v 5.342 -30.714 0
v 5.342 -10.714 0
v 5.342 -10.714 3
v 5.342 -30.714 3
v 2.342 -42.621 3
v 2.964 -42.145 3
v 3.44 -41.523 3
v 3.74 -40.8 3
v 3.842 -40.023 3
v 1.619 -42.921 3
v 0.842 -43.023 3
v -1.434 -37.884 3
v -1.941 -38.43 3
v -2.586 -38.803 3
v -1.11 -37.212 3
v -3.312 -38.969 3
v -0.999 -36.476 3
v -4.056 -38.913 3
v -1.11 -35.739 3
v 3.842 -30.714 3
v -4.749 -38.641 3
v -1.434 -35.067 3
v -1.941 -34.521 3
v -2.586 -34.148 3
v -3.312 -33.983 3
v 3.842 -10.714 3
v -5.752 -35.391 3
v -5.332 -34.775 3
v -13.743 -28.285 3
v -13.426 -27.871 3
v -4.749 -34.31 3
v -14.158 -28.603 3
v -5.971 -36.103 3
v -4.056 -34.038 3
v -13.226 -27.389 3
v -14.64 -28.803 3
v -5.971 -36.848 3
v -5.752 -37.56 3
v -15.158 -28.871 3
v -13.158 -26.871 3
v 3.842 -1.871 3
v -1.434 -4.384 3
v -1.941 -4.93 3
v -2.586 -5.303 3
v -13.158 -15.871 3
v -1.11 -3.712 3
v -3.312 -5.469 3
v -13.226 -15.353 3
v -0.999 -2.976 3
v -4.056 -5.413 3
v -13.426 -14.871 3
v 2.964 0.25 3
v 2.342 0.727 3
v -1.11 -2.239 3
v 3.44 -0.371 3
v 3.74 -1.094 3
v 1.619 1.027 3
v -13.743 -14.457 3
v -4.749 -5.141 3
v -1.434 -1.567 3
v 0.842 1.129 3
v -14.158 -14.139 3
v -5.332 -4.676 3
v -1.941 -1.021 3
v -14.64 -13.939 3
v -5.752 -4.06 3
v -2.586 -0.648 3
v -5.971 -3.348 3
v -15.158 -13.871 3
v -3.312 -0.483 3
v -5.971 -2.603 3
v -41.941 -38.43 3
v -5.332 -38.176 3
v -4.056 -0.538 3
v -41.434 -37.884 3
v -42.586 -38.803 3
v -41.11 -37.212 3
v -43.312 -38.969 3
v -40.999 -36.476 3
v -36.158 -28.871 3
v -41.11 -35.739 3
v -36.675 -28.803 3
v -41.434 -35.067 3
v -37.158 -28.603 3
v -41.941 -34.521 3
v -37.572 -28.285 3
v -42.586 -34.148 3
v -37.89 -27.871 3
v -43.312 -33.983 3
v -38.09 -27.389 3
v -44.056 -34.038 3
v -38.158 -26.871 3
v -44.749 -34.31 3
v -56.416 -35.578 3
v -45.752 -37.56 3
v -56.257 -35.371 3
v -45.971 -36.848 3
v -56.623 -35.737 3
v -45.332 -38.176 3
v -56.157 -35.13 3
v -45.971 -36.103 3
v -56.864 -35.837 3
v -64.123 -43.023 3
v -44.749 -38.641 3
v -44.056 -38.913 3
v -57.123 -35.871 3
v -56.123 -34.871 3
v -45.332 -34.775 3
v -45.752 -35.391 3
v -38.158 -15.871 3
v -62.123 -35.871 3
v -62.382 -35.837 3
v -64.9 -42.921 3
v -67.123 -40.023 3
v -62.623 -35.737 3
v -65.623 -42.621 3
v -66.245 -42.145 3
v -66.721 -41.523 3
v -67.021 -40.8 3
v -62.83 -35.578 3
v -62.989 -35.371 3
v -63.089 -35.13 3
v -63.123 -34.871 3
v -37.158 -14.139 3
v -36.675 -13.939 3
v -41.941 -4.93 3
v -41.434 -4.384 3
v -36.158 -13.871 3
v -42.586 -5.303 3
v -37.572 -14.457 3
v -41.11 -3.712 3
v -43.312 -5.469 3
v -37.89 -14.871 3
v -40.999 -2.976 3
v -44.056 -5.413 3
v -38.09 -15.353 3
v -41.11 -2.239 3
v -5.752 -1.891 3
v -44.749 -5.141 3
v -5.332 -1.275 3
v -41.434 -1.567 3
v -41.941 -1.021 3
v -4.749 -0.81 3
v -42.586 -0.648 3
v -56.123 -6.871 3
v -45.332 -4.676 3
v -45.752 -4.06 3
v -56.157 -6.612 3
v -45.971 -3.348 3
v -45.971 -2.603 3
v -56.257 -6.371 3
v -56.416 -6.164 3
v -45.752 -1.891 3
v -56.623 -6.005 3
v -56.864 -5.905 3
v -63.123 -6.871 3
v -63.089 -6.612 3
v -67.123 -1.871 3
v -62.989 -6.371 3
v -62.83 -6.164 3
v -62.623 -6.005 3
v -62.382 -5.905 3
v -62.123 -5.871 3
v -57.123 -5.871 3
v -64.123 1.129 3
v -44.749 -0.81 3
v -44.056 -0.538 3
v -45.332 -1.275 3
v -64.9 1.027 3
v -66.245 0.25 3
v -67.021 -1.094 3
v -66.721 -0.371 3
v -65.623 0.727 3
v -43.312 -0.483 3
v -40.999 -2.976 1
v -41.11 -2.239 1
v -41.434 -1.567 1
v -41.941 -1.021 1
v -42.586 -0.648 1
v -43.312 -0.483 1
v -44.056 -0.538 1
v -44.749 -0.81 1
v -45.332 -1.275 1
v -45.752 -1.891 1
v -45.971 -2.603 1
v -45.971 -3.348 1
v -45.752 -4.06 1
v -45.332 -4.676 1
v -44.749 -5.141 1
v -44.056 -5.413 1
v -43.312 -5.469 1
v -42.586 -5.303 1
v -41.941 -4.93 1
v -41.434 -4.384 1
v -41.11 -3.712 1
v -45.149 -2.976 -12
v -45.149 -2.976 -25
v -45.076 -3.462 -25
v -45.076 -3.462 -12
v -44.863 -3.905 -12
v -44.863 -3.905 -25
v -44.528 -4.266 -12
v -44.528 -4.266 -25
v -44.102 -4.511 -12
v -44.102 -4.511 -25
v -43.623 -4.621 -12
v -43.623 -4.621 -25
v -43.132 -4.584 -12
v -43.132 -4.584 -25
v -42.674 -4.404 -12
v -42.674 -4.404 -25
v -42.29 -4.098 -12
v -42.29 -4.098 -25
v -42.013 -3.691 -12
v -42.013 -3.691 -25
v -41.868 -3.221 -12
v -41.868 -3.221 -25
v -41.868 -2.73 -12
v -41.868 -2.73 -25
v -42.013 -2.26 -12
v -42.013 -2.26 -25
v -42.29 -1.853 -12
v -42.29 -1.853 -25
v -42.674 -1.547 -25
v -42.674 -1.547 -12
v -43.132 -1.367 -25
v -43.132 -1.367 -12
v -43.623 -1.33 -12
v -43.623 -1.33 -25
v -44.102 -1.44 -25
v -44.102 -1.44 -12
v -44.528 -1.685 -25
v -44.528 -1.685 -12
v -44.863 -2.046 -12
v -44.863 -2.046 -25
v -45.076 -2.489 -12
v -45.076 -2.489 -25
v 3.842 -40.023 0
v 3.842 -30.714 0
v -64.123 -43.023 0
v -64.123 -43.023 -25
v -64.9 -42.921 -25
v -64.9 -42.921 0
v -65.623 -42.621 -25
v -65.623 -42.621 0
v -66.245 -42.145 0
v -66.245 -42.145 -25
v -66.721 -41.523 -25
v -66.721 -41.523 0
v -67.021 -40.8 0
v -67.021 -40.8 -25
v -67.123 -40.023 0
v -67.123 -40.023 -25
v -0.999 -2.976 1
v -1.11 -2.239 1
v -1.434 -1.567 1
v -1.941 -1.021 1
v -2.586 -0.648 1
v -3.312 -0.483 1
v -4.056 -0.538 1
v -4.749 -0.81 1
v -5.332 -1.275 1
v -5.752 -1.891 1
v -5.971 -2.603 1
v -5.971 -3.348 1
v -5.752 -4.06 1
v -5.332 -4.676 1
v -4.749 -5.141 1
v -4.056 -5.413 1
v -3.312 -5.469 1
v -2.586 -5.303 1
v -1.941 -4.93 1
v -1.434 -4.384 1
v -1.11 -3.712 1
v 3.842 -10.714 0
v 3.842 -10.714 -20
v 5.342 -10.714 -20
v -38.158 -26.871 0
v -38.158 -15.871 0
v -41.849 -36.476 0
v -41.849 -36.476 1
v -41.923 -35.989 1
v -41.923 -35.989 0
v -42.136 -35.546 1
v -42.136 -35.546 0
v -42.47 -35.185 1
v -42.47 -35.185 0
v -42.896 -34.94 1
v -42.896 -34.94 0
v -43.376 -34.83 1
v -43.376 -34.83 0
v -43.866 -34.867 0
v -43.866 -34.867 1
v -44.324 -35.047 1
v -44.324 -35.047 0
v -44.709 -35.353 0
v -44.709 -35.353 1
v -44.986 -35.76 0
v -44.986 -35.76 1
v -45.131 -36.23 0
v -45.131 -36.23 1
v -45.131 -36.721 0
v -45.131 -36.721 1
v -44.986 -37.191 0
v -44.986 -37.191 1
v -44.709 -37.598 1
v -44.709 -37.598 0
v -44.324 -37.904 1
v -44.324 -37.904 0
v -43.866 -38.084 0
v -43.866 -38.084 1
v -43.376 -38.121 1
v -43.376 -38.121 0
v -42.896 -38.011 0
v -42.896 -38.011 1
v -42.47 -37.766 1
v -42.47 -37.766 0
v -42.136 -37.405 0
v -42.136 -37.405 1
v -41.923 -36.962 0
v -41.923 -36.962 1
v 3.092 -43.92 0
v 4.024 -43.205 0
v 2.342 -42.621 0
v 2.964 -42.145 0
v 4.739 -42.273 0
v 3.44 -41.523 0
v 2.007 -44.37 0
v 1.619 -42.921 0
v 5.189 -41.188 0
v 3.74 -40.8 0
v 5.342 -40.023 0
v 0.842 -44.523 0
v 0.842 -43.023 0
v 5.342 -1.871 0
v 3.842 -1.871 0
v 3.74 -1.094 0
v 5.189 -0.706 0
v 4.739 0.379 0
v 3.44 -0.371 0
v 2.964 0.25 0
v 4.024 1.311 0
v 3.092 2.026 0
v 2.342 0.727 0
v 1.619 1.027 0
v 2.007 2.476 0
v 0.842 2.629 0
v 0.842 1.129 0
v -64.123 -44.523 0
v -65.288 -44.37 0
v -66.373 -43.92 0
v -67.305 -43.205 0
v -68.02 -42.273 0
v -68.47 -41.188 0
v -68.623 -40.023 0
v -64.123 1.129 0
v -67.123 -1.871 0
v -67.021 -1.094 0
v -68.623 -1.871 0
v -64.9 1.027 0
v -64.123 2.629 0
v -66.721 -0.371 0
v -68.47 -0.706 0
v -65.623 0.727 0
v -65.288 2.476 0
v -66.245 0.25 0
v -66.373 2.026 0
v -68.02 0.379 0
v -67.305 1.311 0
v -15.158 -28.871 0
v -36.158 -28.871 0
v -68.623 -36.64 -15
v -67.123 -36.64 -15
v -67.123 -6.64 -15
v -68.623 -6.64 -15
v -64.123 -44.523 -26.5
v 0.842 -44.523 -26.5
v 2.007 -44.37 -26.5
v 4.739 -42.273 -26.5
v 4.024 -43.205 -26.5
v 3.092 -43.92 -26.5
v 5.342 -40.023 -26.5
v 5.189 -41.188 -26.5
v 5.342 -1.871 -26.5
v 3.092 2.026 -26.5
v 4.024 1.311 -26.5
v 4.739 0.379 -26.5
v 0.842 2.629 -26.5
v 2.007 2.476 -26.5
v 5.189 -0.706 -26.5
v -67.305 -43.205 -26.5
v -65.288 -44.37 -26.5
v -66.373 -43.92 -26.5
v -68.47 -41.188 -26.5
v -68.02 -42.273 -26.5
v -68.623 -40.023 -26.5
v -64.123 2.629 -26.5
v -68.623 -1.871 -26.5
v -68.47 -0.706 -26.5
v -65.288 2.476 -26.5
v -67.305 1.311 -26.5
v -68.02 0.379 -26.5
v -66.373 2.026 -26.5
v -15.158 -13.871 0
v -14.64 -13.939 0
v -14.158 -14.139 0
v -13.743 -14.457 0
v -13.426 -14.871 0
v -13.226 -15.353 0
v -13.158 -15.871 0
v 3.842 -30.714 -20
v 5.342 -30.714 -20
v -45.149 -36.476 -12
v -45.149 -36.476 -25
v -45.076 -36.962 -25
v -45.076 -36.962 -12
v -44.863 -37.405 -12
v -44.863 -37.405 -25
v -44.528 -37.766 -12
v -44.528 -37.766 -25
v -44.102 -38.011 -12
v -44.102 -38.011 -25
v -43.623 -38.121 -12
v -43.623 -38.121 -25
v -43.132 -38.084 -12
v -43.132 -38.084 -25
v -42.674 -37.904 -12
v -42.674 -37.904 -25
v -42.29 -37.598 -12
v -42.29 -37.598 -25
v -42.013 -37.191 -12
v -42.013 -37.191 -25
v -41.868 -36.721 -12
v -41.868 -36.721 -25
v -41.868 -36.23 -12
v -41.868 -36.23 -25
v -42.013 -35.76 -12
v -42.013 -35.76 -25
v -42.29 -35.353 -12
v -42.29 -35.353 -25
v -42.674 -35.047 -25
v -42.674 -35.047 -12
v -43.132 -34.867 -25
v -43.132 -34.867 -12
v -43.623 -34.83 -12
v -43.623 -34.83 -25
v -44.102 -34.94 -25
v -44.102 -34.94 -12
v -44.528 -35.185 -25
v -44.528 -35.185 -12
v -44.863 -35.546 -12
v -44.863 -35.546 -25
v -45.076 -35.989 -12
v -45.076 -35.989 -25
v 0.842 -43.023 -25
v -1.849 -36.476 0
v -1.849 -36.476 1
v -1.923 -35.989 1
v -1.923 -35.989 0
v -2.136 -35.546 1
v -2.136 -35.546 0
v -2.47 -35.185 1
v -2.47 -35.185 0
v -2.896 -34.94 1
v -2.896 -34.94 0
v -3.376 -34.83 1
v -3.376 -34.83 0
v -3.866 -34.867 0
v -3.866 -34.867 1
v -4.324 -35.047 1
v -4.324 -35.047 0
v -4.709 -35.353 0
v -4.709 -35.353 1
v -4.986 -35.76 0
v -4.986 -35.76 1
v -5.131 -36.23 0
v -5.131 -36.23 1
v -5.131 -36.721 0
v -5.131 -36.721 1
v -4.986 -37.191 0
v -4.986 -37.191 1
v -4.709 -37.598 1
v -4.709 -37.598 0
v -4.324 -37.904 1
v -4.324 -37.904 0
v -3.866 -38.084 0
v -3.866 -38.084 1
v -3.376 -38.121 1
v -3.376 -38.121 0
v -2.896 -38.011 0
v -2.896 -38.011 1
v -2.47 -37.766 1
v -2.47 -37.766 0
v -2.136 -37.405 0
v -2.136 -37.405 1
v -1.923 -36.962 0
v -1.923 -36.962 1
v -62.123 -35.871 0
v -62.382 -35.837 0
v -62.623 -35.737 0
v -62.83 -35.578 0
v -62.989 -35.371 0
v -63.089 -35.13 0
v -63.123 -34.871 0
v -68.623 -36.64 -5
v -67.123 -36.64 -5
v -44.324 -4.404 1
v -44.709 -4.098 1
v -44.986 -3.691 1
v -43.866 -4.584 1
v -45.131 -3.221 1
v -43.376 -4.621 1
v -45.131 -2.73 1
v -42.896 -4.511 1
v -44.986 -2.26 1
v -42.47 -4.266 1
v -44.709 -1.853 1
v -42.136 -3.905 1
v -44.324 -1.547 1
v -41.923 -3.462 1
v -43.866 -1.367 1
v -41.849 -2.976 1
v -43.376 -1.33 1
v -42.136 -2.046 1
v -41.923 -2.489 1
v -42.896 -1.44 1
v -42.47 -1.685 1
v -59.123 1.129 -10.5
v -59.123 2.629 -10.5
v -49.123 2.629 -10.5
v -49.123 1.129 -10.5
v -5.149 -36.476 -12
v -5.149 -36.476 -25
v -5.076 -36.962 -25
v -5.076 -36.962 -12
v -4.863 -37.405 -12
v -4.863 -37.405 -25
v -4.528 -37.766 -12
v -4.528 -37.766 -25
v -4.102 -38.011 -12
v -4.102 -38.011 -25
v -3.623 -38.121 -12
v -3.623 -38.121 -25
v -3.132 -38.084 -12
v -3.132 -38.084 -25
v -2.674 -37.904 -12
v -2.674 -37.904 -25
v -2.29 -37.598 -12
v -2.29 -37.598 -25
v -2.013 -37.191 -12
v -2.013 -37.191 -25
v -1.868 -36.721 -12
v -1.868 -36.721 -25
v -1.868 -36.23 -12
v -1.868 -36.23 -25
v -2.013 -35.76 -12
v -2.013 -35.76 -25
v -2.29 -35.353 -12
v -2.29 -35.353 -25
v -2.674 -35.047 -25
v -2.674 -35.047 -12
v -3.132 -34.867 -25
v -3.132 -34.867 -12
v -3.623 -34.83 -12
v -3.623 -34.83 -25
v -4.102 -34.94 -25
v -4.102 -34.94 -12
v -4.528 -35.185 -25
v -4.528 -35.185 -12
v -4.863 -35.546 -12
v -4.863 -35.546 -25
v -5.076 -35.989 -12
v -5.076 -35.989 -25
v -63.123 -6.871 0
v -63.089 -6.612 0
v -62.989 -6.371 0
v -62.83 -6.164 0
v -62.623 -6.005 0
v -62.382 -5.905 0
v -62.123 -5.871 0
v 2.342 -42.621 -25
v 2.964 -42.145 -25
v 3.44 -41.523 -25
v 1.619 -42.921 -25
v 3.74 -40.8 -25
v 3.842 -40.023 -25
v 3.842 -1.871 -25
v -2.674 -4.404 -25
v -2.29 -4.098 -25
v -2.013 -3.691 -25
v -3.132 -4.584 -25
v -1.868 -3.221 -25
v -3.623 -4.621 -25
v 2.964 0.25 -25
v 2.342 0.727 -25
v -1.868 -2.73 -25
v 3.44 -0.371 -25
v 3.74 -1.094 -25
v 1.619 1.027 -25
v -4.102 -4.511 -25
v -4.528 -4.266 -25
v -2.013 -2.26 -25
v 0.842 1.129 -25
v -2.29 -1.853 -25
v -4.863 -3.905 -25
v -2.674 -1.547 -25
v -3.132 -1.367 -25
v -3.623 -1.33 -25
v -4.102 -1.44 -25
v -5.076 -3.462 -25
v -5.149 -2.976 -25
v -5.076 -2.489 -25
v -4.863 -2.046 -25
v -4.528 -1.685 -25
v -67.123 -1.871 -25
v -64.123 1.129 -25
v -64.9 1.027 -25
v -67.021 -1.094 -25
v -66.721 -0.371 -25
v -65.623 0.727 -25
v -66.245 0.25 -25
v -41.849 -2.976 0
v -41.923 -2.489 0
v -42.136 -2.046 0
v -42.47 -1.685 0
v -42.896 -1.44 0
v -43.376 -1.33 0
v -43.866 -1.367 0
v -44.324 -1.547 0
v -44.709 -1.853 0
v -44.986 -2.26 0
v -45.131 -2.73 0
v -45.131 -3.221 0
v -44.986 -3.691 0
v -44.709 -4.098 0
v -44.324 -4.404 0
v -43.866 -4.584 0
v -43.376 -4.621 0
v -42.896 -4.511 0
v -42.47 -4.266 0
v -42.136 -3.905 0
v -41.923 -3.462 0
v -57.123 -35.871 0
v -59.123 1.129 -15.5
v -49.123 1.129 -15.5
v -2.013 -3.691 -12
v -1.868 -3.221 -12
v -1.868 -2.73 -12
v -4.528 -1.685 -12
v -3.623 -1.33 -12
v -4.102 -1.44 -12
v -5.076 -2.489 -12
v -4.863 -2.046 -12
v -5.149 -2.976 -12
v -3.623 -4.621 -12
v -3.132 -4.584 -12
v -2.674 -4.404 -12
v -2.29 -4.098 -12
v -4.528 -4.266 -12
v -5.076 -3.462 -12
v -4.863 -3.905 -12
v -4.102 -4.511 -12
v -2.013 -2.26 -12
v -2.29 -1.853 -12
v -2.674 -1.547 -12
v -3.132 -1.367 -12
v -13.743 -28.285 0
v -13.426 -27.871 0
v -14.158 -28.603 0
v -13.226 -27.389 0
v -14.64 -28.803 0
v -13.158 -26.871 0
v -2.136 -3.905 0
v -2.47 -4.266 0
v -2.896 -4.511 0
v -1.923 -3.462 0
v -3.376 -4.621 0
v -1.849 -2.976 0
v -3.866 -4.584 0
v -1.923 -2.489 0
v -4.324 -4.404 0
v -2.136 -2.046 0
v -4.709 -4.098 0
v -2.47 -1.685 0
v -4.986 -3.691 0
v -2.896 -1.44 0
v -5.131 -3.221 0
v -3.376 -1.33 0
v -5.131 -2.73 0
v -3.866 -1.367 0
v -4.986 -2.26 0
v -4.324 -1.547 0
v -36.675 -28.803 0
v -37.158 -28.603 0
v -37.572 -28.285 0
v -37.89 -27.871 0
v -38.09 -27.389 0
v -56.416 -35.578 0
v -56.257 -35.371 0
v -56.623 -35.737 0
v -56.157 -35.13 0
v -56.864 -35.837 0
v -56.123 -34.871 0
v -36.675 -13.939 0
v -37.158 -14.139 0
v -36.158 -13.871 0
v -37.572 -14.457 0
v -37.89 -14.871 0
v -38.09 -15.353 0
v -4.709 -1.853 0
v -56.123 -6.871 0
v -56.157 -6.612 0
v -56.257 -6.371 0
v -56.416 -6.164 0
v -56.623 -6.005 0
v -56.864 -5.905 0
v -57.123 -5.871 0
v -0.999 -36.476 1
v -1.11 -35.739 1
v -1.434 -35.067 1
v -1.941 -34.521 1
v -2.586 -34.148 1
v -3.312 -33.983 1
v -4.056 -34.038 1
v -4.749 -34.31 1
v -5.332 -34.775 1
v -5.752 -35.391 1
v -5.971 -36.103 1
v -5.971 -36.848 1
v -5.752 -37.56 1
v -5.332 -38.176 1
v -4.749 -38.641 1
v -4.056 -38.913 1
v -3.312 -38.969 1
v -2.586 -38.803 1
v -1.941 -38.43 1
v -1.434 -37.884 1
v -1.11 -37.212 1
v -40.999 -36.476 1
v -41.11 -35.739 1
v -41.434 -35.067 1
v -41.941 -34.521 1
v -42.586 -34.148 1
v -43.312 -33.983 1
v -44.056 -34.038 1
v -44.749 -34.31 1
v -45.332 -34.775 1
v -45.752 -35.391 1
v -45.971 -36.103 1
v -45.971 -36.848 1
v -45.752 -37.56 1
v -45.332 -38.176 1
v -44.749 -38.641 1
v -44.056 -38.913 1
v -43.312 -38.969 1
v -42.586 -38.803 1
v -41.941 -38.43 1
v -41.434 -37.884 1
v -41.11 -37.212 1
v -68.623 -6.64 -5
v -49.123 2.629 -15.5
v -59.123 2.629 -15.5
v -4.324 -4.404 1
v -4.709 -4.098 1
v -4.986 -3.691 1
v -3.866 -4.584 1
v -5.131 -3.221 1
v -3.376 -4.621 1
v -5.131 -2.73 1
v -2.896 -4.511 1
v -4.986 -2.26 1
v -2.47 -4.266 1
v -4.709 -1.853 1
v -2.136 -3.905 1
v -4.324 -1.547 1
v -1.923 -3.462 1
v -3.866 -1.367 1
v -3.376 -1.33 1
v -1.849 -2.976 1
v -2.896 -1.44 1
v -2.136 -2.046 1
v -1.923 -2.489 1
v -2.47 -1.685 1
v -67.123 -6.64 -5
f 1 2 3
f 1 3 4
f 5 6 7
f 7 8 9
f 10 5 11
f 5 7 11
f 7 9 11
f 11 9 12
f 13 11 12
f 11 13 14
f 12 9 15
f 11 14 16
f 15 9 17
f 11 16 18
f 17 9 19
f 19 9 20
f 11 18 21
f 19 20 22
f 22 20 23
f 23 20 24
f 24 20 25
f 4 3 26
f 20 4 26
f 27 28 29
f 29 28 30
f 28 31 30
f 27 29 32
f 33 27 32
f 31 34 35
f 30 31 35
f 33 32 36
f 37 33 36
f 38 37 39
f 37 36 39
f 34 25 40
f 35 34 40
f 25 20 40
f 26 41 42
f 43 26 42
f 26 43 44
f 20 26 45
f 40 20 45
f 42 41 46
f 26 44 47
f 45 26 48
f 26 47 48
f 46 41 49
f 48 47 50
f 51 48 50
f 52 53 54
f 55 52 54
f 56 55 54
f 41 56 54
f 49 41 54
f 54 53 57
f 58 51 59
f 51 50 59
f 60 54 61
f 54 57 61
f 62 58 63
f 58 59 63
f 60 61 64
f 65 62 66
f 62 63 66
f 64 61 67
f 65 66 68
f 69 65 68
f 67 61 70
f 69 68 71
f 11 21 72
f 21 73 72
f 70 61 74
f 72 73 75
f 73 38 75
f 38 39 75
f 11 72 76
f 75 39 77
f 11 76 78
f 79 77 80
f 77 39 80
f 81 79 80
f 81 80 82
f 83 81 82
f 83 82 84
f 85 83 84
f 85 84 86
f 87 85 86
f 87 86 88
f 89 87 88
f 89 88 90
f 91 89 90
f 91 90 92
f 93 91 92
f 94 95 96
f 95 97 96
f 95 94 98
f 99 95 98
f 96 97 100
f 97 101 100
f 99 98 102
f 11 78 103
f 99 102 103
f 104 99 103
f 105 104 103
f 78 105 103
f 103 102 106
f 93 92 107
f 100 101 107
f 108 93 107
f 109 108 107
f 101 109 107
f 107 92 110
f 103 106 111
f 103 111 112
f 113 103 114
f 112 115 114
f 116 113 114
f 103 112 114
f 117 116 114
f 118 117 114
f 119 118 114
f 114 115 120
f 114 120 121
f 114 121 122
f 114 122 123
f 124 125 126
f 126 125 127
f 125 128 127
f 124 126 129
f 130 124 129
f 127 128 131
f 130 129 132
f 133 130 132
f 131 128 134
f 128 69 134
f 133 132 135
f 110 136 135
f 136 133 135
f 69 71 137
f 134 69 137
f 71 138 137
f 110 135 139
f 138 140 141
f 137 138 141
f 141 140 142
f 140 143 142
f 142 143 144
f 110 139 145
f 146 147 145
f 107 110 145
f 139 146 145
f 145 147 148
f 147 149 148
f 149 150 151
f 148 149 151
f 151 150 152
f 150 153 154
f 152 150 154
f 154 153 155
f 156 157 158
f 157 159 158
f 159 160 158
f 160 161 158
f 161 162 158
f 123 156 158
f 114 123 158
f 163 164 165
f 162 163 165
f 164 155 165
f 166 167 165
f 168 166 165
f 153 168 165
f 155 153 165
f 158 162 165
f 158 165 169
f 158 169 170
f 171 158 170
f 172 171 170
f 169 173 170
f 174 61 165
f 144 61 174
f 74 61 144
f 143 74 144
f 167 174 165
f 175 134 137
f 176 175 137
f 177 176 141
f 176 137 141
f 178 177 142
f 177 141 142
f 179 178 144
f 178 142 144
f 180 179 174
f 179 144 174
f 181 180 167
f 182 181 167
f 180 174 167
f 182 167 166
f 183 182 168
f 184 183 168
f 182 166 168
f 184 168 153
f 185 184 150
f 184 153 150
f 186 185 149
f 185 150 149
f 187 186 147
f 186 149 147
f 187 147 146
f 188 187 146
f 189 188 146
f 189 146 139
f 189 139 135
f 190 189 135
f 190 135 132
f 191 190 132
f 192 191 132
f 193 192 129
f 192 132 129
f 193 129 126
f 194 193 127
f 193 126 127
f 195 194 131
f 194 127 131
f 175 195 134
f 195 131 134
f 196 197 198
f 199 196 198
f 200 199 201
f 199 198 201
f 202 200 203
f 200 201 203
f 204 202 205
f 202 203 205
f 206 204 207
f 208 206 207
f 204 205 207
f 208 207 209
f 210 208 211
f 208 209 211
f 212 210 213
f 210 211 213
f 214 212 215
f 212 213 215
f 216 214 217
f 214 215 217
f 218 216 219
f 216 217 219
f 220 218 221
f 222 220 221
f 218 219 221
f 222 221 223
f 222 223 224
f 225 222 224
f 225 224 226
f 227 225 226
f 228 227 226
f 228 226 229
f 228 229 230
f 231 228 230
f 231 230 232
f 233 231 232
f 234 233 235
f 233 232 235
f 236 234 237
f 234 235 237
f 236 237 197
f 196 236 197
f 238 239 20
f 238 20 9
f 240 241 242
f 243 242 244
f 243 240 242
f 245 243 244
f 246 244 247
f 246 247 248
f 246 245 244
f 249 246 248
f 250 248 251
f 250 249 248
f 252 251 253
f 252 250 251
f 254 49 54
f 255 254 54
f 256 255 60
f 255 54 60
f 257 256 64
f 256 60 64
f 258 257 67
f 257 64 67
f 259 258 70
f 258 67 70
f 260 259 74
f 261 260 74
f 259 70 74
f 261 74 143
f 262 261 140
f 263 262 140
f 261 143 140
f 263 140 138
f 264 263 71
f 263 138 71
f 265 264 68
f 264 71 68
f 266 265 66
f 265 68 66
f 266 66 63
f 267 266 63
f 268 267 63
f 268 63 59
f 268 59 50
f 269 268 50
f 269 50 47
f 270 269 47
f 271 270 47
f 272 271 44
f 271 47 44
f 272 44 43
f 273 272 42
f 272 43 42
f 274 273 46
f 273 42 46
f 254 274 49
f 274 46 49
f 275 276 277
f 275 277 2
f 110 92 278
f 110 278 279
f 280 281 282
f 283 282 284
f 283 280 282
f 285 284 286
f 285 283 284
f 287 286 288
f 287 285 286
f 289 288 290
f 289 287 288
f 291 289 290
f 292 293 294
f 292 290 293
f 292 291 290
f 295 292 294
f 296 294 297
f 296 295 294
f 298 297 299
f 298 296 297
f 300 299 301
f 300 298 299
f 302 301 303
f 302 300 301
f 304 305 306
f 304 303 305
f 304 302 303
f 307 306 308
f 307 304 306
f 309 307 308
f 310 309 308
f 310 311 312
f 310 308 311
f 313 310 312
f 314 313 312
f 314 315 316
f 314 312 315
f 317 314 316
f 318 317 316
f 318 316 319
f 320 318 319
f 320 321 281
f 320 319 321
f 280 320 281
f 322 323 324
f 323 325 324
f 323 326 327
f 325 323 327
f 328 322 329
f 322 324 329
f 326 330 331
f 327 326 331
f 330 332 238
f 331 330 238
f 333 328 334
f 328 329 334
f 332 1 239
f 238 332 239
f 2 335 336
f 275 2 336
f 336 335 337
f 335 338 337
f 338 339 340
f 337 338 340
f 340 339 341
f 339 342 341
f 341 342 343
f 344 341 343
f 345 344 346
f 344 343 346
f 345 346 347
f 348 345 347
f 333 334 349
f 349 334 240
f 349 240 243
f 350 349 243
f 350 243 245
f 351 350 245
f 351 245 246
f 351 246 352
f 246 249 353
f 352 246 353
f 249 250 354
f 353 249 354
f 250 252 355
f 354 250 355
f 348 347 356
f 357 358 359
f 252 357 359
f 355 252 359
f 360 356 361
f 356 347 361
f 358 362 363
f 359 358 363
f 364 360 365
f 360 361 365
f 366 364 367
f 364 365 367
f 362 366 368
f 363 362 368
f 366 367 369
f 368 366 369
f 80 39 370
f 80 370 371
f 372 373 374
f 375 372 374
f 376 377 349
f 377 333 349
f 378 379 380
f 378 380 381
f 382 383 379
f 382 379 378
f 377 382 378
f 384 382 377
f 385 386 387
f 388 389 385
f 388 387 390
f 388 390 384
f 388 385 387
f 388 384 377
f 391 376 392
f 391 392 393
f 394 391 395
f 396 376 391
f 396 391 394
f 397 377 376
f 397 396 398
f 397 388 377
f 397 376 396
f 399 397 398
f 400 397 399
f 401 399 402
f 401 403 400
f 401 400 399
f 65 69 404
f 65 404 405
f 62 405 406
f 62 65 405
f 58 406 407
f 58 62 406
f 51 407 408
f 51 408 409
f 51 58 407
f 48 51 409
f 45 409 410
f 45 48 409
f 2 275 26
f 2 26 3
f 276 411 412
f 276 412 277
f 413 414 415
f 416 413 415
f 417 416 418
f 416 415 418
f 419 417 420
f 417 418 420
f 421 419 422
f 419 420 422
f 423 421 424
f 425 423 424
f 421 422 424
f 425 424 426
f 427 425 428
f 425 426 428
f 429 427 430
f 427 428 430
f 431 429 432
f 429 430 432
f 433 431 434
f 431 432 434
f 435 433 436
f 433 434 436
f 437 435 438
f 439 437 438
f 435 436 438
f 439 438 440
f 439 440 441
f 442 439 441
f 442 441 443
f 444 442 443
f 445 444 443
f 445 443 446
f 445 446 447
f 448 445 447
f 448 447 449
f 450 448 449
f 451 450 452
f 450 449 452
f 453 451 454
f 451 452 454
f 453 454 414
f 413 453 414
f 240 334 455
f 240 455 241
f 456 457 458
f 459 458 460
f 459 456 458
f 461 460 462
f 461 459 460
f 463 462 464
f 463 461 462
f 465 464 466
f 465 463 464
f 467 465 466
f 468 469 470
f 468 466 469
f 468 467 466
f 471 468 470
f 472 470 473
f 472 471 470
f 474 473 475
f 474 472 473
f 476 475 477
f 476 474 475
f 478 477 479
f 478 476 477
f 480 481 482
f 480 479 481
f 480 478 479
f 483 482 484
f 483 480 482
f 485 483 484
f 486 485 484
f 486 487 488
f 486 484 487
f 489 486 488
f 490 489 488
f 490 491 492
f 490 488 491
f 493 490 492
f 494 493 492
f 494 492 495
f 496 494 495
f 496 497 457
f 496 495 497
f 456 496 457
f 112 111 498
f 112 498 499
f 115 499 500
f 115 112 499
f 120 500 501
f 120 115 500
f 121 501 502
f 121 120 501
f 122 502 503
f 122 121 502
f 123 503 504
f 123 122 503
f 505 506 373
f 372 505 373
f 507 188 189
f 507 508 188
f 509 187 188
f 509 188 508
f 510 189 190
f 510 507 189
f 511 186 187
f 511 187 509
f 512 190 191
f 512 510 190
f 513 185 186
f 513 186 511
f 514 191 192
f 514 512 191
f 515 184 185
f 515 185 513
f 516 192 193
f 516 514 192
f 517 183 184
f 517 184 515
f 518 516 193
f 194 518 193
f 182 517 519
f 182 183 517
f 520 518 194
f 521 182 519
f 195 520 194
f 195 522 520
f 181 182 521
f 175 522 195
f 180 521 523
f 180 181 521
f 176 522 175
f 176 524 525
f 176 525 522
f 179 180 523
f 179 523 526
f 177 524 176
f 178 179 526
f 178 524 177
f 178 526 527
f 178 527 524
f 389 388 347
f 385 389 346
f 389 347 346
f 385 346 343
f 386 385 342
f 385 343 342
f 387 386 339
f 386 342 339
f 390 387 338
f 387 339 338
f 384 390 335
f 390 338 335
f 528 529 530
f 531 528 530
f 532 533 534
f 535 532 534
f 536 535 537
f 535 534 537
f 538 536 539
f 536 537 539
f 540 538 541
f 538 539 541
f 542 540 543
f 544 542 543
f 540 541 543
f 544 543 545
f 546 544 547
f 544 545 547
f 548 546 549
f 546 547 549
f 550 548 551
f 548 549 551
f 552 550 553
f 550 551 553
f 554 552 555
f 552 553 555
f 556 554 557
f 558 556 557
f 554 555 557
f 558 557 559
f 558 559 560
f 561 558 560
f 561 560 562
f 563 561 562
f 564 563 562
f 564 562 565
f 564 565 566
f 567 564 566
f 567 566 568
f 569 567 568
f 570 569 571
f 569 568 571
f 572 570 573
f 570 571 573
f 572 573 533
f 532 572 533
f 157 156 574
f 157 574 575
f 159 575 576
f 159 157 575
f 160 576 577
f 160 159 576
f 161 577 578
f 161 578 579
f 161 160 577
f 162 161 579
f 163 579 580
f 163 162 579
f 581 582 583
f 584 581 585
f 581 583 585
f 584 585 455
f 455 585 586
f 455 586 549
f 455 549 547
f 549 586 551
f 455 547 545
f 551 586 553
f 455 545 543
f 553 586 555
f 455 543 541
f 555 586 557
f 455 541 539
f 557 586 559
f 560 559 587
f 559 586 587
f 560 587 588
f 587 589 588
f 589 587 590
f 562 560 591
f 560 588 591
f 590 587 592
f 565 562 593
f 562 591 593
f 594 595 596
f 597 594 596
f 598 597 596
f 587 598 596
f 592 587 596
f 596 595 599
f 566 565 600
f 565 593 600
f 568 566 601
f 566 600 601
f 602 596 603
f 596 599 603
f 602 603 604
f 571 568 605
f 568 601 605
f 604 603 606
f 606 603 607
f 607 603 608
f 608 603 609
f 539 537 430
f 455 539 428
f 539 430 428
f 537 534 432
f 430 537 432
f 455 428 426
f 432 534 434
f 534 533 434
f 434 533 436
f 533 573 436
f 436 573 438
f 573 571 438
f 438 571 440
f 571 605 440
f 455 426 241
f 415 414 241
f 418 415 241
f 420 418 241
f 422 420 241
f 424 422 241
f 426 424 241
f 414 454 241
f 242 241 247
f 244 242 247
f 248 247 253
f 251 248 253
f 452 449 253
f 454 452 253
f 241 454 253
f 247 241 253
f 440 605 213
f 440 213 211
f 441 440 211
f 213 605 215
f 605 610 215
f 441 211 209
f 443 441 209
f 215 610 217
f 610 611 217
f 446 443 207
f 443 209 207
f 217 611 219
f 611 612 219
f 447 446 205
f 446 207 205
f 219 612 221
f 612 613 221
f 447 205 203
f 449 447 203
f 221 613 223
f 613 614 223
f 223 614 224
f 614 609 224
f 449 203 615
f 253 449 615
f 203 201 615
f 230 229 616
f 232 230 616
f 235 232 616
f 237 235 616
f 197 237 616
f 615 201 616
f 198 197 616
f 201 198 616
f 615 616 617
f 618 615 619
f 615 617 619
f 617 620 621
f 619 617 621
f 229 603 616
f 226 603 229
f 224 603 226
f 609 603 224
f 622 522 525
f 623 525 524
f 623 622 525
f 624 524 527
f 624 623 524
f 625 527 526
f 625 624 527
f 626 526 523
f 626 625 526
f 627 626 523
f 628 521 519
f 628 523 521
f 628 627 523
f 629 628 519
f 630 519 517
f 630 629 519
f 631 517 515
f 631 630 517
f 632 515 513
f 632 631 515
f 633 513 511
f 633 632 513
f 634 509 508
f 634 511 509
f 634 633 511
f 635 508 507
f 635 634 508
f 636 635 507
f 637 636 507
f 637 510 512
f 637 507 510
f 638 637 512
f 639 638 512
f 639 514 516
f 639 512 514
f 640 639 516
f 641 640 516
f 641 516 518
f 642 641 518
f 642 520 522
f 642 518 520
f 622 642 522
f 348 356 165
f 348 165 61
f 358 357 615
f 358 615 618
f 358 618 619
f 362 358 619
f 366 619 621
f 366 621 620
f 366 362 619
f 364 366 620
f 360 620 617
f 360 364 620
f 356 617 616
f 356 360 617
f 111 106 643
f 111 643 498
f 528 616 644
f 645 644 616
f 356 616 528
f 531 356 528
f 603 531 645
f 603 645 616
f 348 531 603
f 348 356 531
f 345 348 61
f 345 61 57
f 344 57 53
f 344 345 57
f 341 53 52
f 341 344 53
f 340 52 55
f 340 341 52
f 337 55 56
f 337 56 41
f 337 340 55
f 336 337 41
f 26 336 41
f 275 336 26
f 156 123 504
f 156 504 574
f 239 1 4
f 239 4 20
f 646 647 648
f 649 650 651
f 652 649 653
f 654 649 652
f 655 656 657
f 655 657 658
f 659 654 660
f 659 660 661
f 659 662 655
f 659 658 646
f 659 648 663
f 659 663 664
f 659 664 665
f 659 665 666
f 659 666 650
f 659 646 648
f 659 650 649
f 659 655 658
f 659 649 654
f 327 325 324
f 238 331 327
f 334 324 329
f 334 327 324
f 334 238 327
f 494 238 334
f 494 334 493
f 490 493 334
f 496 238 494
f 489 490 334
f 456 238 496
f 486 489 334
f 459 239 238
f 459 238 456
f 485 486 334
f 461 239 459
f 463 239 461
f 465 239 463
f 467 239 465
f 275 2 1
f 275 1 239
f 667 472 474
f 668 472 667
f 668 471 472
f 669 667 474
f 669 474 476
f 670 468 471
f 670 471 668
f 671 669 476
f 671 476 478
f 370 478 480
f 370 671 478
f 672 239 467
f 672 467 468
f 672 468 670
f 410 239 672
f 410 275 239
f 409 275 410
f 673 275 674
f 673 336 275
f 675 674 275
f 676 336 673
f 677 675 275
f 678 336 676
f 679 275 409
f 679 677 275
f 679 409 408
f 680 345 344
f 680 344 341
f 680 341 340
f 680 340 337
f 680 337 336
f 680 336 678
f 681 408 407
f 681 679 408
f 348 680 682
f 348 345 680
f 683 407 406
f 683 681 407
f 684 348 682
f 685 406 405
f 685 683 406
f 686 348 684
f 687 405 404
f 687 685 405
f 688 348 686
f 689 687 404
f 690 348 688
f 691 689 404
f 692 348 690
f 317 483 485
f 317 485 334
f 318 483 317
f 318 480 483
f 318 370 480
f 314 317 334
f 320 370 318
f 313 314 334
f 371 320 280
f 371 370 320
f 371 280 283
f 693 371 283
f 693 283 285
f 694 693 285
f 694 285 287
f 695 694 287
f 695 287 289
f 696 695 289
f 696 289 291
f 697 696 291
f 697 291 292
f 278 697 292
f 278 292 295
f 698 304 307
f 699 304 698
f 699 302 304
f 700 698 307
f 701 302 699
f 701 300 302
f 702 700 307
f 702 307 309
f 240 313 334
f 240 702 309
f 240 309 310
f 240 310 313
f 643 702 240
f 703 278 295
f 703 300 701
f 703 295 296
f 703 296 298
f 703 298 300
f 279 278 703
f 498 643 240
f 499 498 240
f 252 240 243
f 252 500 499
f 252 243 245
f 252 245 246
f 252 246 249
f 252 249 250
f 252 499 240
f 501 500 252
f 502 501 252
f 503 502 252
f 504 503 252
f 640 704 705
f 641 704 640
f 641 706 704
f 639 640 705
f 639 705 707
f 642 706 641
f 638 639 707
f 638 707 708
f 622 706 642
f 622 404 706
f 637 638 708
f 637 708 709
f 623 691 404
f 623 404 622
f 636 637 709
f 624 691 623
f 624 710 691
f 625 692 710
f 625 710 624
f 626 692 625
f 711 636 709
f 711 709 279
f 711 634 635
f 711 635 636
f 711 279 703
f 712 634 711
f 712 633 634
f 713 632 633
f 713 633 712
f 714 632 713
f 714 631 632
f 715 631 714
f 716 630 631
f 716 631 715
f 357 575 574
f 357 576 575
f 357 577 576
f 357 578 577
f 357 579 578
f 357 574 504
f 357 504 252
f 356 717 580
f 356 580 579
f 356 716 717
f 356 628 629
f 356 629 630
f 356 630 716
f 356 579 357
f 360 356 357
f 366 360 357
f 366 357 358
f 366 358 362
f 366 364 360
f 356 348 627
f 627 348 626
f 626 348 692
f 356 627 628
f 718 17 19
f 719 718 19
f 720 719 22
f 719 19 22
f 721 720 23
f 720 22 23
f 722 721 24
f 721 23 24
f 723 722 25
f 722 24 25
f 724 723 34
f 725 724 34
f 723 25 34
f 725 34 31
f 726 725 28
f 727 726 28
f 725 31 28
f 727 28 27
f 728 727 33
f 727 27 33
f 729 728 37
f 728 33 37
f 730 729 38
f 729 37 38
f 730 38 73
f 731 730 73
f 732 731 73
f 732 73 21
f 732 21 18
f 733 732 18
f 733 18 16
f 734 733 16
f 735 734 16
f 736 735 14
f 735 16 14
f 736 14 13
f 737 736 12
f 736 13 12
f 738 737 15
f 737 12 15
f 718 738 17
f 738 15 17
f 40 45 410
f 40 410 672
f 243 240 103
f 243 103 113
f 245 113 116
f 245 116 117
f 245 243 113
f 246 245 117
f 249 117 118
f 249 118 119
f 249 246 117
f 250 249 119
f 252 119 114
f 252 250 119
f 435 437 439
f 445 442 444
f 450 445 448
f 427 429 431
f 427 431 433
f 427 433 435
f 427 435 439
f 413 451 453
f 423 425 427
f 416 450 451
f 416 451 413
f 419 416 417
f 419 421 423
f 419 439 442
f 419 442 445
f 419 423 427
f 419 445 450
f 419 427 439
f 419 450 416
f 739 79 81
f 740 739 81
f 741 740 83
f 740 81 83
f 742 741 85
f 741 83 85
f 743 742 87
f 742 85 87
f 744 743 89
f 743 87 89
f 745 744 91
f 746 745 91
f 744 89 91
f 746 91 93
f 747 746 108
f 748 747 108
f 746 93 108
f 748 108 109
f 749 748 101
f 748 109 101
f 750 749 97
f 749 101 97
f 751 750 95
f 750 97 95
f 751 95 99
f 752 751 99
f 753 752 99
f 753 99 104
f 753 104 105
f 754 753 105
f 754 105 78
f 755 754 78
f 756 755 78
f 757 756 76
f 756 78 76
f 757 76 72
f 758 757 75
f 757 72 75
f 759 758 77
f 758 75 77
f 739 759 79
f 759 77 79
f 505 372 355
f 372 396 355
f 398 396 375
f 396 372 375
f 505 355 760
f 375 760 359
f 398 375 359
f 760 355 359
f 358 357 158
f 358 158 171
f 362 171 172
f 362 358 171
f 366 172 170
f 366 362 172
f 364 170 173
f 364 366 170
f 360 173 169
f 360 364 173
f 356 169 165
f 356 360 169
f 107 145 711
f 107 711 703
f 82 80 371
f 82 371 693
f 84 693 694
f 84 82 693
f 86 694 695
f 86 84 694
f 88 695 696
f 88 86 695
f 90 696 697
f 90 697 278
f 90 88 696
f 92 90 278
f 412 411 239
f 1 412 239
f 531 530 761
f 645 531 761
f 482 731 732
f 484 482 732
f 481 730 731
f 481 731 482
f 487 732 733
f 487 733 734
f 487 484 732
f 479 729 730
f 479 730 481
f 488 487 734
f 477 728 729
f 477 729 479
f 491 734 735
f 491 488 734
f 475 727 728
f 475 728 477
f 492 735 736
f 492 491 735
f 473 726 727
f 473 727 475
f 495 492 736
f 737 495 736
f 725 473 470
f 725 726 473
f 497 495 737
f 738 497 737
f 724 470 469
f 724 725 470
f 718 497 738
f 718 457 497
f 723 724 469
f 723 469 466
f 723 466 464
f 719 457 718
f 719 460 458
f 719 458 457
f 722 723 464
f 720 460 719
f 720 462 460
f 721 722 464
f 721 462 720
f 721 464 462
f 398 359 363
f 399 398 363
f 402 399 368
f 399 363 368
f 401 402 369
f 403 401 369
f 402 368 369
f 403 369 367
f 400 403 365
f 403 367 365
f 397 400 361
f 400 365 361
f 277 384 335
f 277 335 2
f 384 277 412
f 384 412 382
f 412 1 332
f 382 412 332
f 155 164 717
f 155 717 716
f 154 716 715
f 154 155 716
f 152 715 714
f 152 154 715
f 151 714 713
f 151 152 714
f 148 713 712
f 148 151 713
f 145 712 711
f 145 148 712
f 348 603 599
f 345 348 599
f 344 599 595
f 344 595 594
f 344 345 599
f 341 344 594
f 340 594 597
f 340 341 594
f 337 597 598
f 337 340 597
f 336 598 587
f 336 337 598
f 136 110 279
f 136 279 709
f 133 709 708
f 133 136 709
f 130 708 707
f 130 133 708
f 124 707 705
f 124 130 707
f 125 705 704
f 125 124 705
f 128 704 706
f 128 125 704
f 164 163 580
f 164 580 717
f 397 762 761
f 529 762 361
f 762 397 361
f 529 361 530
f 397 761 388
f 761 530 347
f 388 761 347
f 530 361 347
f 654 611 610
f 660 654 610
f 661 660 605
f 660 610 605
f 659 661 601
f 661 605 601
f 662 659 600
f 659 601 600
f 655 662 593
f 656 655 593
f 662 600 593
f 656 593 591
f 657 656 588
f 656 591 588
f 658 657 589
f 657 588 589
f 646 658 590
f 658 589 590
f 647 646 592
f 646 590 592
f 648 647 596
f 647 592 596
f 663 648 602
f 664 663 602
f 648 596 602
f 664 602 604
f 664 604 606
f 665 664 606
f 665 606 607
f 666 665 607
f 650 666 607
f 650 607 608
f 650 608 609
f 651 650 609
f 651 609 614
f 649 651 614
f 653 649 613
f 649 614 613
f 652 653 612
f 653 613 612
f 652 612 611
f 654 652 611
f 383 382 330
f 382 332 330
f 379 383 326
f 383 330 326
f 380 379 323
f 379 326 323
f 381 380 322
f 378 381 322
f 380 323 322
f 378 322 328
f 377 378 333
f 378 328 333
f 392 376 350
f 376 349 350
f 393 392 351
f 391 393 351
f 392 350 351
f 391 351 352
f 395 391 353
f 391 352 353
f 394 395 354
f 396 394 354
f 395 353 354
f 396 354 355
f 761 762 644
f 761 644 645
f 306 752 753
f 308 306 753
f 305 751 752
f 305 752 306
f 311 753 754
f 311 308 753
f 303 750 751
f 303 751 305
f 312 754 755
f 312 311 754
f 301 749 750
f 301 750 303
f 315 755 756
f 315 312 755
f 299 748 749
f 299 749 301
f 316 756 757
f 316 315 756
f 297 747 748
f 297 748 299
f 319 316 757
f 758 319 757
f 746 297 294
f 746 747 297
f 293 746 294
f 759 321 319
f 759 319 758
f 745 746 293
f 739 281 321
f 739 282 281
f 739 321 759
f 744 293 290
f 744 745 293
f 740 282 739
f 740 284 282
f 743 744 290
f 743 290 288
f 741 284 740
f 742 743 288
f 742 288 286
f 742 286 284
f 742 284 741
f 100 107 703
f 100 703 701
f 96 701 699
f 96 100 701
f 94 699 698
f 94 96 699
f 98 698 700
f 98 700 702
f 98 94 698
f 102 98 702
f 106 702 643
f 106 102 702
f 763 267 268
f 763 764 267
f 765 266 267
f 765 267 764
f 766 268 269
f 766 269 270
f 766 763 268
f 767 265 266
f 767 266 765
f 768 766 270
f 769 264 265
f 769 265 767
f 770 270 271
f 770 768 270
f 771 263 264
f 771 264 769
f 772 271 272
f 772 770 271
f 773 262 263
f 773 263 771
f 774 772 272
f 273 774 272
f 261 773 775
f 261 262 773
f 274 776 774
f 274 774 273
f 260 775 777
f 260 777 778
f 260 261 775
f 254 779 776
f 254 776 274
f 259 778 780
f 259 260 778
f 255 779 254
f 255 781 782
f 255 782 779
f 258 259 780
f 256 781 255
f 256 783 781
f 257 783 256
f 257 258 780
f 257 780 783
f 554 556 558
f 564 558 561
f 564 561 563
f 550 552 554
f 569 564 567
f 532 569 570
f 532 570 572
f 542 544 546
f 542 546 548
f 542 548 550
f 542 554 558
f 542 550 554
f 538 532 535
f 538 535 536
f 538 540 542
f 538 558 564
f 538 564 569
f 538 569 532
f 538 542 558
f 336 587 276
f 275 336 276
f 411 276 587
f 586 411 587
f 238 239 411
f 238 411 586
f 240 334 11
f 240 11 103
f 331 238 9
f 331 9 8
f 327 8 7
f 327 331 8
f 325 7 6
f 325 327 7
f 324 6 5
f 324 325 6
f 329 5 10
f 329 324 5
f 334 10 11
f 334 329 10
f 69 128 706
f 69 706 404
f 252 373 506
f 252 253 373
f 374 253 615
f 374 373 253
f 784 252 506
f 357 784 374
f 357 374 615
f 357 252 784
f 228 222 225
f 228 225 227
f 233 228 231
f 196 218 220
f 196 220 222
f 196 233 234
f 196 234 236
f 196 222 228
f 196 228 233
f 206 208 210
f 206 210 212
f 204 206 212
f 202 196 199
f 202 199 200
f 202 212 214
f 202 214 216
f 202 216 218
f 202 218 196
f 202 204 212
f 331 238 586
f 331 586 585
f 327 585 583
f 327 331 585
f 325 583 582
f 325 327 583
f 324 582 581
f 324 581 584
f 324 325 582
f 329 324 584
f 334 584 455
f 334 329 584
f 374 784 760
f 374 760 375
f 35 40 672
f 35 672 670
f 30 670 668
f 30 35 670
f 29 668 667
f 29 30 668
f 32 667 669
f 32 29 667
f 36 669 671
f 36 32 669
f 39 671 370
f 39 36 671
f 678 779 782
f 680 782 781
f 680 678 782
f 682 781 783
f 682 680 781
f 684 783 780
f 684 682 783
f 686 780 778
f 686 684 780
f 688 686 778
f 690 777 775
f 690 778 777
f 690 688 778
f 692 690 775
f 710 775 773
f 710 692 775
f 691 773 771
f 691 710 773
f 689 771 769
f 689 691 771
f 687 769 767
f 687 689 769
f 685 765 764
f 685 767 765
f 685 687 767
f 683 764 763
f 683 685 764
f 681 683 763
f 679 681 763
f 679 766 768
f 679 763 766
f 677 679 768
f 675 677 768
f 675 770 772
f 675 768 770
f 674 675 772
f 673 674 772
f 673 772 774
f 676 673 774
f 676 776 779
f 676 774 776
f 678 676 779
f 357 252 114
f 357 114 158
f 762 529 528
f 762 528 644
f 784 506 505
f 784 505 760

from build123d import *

# Parameters (mm, degrees)
EXTRUDE_3_DEPTH     = 25
EXTRUDE_4_DEPTH     = 1.5
SKETCH_3_R          = 1.65
EXTRUDE_6_DEPTH     = 13
CUT_EXTRUDE_1_REACH = 91.083
SKETCH_4_W          = 10
SKETCH_4_H          = 30
CUT_EXTRUDE_2_REACH = 91.083
SKETCH_5_W          = 20
SKETCH_5_H          = 20
CUT_EXTRUDE_3_REACH = 89.377
SKETCH_6_W          = 10
SKETCH_6_H          = 5
EXTRUDE_7_DEPTH     = 3
CUT_EXTRUDE_START   = -3
SKETCH_8_R          = 1.65
CUT_EXTRUDE_5_DEPTH = 3
CUT_EXTRUDE_6_DEPTH = 3
CUT_EXTRUDE_7_DEPTH = 3
SKETCH_11_R         = 2.5
CUT_EXTRUDE_8_DEPTH = 2


with BuildPart() as part:
    # 草图1 → 凸台-拉伸3 (new body)
    with BuildSketch(Plane.XY):
        with BuildLine():
            Line((-64.123292314, 2.629066518), (0.8422956, 2.629066518))
            ThreePointArc((0.8422956, 2.629066518), (4.024276115, 1.311047034), (5.3422956, -1.870933482))
            Line((5.3422956, -1.870933482), (5.3422956, -40.023345988))
            ThreePointArc((5.3422956, -40.023345988), (4.024276115, -43.205326503), (0.8422956, -44.523345988))
            Line((0.8422956, -44.523345988), (-64.123292314, -44.523345988))
            ThreePointArc((-64.123292314, -44.523345988), (-67.30527283, -43.205326503), (-68.623292314, -40.023345988))
            Line((-68.623292314, -40.023345988), (-68.623292314, -1.870933482))
            ThreePointArc((-68.623292314, -1.870933482), (-67.30527283, 1.311047034), (-64.123292314, 2.629066518))
        make_face()
        with BuildLine():
            Line((-64.123292314, 1.129066518), (0.8422956, 1.129066518))
            ThreePointArc((0.8422956, 1.129066518), (2.963615943, 0.250386862), (3.8422956, -1.870933482))
            Line((3.8422956, -1.870933482), (3.8422956, -40.023345988))
            ThreePointArc((3.8422956, -40.023345988), (2.963615943, -42.144666332), (0.8422956, -43.023345988))
            Line((0.8422956, -43.023345988), (-64.123292314, -43.023345988))
            ThreePointArc((-64.123292314, -43.023345988), (-66.244612658, -42.144666332), (-67.123292314, -40.023345988))
            Line((-67.123292314, -40.023345988), (-67.123292314, -1.870933482))
            ThreePointArc((-67.123292314, -1.870933482), (-66.244612658, 0.250386862), (-64.123292314, 1.129066518))
        make_face(mode=Mode.SUBTRACT)
    extrude(amount=-EXTRUDE_3_DEPTH)

    # 草图2 → 凸台-拉伸4 (add)
    with BuildSketch(Plane(origin=(0, 0, -25), x_dir=(-1, 0, 0), z_dir=(0, 0, -1))):
        with BuildLine():
            Line((64.123292314, 2.629066518), (-0.8422956, 2.629066518))
            ThreePointArc((-0.8422956, 2.629066518), (-4.024276115, 1.311047034), (-5.3422956, -1.870933482))
            Line((-5.3422956, -1.870933482), (-5.3422956, -40.023345988))
            ThreePointArc((-5.3422956, -40.023345988), (-4.024276115, -43.205326503), (-0.8422956, -44.523345988))
            Line((-0.8422956, -44.523345988), (64.123292314, -44.523345988))
            ThreePointArc((64.123292314, -44.523345988), (67.30527283, -43.205326503), (68.623292314, -40.023345988))
            Line((68.623292314, -40.023345988), (68.623292314, -1.870933482))
            ThreePointArc((68.623292314, -1.870933482), (67.30527283, 1.311047034), (64.123292314, 2.629066518))
        make_face()
    extrude(amount=EXTRUDE_4_DEPTH)

    # 草图3 → 凸台-拉伸6 (add)
    with BuildSketch(Plane.XY.offset(-25)):
        with Locations(Location((-43.499244891, -2.975515145, 0), (0, 0, 180))):
            Circle(SKETCH_3_R)
        with Locations(Location((-3.499244891, -2.975515145, 0), (0, 0, 180))):
            Circle(SKETCH_3_R)
        with Locations(Location((-3.499244891, -36.475515145, 0), (0, 0, 180))):
            Circle(SKETCH_3_R)
        with Locations(Location((-43.499244891, -36.475515145, 0), (0, 0, 180))):
            Circle(SKETCH_3_R)
    extrude(amount=EXTRUDE_6_DEPTH)

    # 草图4 → 切除-拉伸1 (cut, up to next)
    with BuildSketch(Plane(origin=(-67.123292314, 0, 0), x_dir=(0, 0, -1), z_dir=(1, 0, 0)), mode=Mode.PRIVATE) as cut_extrude_1_sk1:
        with Locations((10, -21.6396923)):
            Rectangle(SKETCH_4_W, SKETCH_4_H)
    cut_extrude_1_tool1 = extrude(cut_extrude_1_sk1.sketch, amount=-CUT_EXTRUDE_1_REACH, mode=Mode.PRIVATE) & part.part
    add(cut_extrude_1_tool1.solids().sort_by_distance((-67.123292, -21.639692, -10))[0], mode=Mode.SUBTRACT)

    # 草图5 → 切除-拉伸2 (cut, up to next)
    with BuildSketch(Plane.ZY.offset(-3.8422956), mode=Mode.PRIVATE) as cut_extrude_2_sk1:
        with Locations((-10, -20.713886057)):
            Rectangle(SKETCH_5_W, SKETCH_5_H)
    cut_extrude_2_tool1 = extrude(cut_extrude_2_sk1.sketch, amount=-CUT_EXTRUDE_2_REACH, mode=Mode.PRIVATE) & part.part
    add(cut_extrude_2_tool1.solids().sort_by_distance((3.842296, -20.713886, -10))[0], mode=Mode.SUBTRACT)

    # 草图6 → 切除-拉伸3 (cut, up to next)
    with BuildSketch(Plane(origin=(0, 2.629066518, 0), x_dir=(1, 0, 0), z_dir=(0, 1, 0)), mode=Mode.PRIVATE) as cut_extrude_3_sk1:
        with Locations((-54.123292314, 13)):
            Rectangle(SKETCH_6_W, SKETCH_6_H)
    cut_extrude_3_tool1 = extrude(cut_extrude_3_sk1.sketch, amount=-CUT_EXTRUDE_3_REACH, mode=Mode.PRIVATE) & part.part
    add(cut_extrude_3_tool1.solids().sort_by_distance((-54.123292, 2.629067, -13))[0], mode=Mode.SUBTRACT)


with BuildPart() as body_2:
    # 草图7 → 凸台-拉伸7 (new body)
    with BuildSketch(Plane.XY):
        with BuildLine():
            Line((5.3422956, -10.713886057), (5.3422956, -30.713886057))
            Line((5.3422956, -30.713886057), (3.8422956, -30.713886057))
            Line((3.8422956, -30.713886057), (3.8422956, -40.023345988))
            ThreePointArc((3.8422956, -40.023345988), (2.963615943, -42.144666332), (0.8422956, -43.023345988))
            Line((0.8422956, -43.023345988), (-64.123292314, -43.023345988))
            ThreePointArc((-64.123292314, -43.023345988), (-66.244612658, -42.144666332), (-67.123292314, -40.023345988))
            Line((-67.123292314, -40.023345988), (-67.123292314, -1.870933482))
            ThreePointArc((-67.123292314, -1.870933482), (-66.244612658, 0.250386862), (-64.123292314, 1.129066518))
            Line((-64.123292314, 1.129066518), (0.8422956, 1.129066518))
            ThreePointArc((0.8422956, 1.129066518), (2.963615943, 0.250386862), (3.8422956, -1.870933482))
            Line((3.8422956, -1.870933482), (3.8422956, -10.713886057))
            Line((3.8422956, -10.713886057), (5.3422956, -10.713886057))
        make_face()
    extrude(amount=EXTRUDE_7_DEPTH)

    # 草图8 → 切除-拉伸5 (cut)
    with BuildSketch(Plane.XY.offset(3).offset(CUT_EXTRUDE_START)):
        with Locations((-43.499244891, -2.975515145)):
            Circle(SKETCH_8_R)
        with Locations((-43.499244891, -36.475515145)):
            Circle(SKETCH_8_R)
        with Locations((-3.499244891, -2.975515145)):
            Circle(SKETCH_8_R)
        with Locations((-3.499244891, -36.475515145)):
            Circle(SKETCH_8_R)
    extrude(amount=CUT_EXTRUDE_5_DEPTH, mode=Mode.SUBTRACT)

    # 草图9 → 切除-拉伸6 (cut)
    with BuildSketch(Plane.XY.offset(3)):
        with BuildLine():
            Line((-62.123292314, -5.870933482), (-57.123292314, -5.870933482))
            ThreePointArc((-57.123292314, -5.870933482), (-56.416185533, -6.1638267), (-56.123292314, -6.870933482))
            Line((-56.123292314, -6.870933482), (-56.123292314, -34.870933482))
            ThreePointArc((-56.123292314, -34.870933482), (-56.416185533, -35.578040263), (-57.123292314, -35.870933482))
            Line((-57.123292314, -35.870933482), (-62.123292314, -35.870933482))
            ThreePointArc((-62.123292314, -35.870933482), (-62.830399096, -35.578040263), (-63.123292314, -34.870933482))
            Line((-63.123292314, -34.870933482), (-63.123292314, -6.870933482))
            ThreePointArc((-63.123292314, -6.870933482), (-62.830399096, -6.1638267), (-62.123292314, -5.870933482))
        make_face()
    extrude(amount=-CUT_EXTRUDE_6_DEPTH, mode=Mode.SUBTRACT)

    # 草图10 → 切除-拉伸7 (cut)
    with BuildSketch(Plane.XY.offset(3)):
        with BuildLine():
            Line((-36.1577044, -13.870933482), (-15.1577044, -13.870933482))
            ThreePointArc((-15.1577044, -13.870933482), (-13.743490838, -14.456719919), (-13.1577044, -15.870933482))
            Line((-13.1577044, -15.870933482), (-13.1577044, -26.870933482))
            ThreePointArc((-13.1577044, -26.870933482), (-13.743490838, -28.285147044), (-15.1577044, -28.870933482))
            Line((-15.1577044, -28.870933482), (-36.1577044, -28.870933482))
            ThreePointArc((-36.1577044, -28.870933482), (-37.571917963, -28.285147044), (-38.1577044, -26.870933482))
            Line((-38.1577044, -26.870933482), (-38.1577044, -15.870933482))
            ThreePointArc((-38.1577044, -15.870933482), (-37.571917963, -14.456719919), (-36.1577044, -13.870933482))
        make_face()
    extrude(amount=-CUT_EXTRUDE_7_DEPTH, mode=Mode.SUBTRACT)

    # 草图11 → 切除-拉伸8 (cut)
    with BuildSketch(Plane.XY.offset(3)):
        with Locations((-3.499244891, -36.475515145)):
            Circle(SKETCH_11_R)
        with Locations((-3.499244891, -2.975515145)):
            Circle(SKETCH_11_R)
        with Locations((-43.499244891, -2.975515145)):
            Circle(SKETCH_11_R)
        with Locations((-43.499244891, -36.475515145)):
            Circle(SKETCH_11_R)
    extrude(amount=-CUT_EXTRUDE_8_DEPTH, mode=Mode.SUBTRACT)


solid = Compound([part.part, body_2.part])
